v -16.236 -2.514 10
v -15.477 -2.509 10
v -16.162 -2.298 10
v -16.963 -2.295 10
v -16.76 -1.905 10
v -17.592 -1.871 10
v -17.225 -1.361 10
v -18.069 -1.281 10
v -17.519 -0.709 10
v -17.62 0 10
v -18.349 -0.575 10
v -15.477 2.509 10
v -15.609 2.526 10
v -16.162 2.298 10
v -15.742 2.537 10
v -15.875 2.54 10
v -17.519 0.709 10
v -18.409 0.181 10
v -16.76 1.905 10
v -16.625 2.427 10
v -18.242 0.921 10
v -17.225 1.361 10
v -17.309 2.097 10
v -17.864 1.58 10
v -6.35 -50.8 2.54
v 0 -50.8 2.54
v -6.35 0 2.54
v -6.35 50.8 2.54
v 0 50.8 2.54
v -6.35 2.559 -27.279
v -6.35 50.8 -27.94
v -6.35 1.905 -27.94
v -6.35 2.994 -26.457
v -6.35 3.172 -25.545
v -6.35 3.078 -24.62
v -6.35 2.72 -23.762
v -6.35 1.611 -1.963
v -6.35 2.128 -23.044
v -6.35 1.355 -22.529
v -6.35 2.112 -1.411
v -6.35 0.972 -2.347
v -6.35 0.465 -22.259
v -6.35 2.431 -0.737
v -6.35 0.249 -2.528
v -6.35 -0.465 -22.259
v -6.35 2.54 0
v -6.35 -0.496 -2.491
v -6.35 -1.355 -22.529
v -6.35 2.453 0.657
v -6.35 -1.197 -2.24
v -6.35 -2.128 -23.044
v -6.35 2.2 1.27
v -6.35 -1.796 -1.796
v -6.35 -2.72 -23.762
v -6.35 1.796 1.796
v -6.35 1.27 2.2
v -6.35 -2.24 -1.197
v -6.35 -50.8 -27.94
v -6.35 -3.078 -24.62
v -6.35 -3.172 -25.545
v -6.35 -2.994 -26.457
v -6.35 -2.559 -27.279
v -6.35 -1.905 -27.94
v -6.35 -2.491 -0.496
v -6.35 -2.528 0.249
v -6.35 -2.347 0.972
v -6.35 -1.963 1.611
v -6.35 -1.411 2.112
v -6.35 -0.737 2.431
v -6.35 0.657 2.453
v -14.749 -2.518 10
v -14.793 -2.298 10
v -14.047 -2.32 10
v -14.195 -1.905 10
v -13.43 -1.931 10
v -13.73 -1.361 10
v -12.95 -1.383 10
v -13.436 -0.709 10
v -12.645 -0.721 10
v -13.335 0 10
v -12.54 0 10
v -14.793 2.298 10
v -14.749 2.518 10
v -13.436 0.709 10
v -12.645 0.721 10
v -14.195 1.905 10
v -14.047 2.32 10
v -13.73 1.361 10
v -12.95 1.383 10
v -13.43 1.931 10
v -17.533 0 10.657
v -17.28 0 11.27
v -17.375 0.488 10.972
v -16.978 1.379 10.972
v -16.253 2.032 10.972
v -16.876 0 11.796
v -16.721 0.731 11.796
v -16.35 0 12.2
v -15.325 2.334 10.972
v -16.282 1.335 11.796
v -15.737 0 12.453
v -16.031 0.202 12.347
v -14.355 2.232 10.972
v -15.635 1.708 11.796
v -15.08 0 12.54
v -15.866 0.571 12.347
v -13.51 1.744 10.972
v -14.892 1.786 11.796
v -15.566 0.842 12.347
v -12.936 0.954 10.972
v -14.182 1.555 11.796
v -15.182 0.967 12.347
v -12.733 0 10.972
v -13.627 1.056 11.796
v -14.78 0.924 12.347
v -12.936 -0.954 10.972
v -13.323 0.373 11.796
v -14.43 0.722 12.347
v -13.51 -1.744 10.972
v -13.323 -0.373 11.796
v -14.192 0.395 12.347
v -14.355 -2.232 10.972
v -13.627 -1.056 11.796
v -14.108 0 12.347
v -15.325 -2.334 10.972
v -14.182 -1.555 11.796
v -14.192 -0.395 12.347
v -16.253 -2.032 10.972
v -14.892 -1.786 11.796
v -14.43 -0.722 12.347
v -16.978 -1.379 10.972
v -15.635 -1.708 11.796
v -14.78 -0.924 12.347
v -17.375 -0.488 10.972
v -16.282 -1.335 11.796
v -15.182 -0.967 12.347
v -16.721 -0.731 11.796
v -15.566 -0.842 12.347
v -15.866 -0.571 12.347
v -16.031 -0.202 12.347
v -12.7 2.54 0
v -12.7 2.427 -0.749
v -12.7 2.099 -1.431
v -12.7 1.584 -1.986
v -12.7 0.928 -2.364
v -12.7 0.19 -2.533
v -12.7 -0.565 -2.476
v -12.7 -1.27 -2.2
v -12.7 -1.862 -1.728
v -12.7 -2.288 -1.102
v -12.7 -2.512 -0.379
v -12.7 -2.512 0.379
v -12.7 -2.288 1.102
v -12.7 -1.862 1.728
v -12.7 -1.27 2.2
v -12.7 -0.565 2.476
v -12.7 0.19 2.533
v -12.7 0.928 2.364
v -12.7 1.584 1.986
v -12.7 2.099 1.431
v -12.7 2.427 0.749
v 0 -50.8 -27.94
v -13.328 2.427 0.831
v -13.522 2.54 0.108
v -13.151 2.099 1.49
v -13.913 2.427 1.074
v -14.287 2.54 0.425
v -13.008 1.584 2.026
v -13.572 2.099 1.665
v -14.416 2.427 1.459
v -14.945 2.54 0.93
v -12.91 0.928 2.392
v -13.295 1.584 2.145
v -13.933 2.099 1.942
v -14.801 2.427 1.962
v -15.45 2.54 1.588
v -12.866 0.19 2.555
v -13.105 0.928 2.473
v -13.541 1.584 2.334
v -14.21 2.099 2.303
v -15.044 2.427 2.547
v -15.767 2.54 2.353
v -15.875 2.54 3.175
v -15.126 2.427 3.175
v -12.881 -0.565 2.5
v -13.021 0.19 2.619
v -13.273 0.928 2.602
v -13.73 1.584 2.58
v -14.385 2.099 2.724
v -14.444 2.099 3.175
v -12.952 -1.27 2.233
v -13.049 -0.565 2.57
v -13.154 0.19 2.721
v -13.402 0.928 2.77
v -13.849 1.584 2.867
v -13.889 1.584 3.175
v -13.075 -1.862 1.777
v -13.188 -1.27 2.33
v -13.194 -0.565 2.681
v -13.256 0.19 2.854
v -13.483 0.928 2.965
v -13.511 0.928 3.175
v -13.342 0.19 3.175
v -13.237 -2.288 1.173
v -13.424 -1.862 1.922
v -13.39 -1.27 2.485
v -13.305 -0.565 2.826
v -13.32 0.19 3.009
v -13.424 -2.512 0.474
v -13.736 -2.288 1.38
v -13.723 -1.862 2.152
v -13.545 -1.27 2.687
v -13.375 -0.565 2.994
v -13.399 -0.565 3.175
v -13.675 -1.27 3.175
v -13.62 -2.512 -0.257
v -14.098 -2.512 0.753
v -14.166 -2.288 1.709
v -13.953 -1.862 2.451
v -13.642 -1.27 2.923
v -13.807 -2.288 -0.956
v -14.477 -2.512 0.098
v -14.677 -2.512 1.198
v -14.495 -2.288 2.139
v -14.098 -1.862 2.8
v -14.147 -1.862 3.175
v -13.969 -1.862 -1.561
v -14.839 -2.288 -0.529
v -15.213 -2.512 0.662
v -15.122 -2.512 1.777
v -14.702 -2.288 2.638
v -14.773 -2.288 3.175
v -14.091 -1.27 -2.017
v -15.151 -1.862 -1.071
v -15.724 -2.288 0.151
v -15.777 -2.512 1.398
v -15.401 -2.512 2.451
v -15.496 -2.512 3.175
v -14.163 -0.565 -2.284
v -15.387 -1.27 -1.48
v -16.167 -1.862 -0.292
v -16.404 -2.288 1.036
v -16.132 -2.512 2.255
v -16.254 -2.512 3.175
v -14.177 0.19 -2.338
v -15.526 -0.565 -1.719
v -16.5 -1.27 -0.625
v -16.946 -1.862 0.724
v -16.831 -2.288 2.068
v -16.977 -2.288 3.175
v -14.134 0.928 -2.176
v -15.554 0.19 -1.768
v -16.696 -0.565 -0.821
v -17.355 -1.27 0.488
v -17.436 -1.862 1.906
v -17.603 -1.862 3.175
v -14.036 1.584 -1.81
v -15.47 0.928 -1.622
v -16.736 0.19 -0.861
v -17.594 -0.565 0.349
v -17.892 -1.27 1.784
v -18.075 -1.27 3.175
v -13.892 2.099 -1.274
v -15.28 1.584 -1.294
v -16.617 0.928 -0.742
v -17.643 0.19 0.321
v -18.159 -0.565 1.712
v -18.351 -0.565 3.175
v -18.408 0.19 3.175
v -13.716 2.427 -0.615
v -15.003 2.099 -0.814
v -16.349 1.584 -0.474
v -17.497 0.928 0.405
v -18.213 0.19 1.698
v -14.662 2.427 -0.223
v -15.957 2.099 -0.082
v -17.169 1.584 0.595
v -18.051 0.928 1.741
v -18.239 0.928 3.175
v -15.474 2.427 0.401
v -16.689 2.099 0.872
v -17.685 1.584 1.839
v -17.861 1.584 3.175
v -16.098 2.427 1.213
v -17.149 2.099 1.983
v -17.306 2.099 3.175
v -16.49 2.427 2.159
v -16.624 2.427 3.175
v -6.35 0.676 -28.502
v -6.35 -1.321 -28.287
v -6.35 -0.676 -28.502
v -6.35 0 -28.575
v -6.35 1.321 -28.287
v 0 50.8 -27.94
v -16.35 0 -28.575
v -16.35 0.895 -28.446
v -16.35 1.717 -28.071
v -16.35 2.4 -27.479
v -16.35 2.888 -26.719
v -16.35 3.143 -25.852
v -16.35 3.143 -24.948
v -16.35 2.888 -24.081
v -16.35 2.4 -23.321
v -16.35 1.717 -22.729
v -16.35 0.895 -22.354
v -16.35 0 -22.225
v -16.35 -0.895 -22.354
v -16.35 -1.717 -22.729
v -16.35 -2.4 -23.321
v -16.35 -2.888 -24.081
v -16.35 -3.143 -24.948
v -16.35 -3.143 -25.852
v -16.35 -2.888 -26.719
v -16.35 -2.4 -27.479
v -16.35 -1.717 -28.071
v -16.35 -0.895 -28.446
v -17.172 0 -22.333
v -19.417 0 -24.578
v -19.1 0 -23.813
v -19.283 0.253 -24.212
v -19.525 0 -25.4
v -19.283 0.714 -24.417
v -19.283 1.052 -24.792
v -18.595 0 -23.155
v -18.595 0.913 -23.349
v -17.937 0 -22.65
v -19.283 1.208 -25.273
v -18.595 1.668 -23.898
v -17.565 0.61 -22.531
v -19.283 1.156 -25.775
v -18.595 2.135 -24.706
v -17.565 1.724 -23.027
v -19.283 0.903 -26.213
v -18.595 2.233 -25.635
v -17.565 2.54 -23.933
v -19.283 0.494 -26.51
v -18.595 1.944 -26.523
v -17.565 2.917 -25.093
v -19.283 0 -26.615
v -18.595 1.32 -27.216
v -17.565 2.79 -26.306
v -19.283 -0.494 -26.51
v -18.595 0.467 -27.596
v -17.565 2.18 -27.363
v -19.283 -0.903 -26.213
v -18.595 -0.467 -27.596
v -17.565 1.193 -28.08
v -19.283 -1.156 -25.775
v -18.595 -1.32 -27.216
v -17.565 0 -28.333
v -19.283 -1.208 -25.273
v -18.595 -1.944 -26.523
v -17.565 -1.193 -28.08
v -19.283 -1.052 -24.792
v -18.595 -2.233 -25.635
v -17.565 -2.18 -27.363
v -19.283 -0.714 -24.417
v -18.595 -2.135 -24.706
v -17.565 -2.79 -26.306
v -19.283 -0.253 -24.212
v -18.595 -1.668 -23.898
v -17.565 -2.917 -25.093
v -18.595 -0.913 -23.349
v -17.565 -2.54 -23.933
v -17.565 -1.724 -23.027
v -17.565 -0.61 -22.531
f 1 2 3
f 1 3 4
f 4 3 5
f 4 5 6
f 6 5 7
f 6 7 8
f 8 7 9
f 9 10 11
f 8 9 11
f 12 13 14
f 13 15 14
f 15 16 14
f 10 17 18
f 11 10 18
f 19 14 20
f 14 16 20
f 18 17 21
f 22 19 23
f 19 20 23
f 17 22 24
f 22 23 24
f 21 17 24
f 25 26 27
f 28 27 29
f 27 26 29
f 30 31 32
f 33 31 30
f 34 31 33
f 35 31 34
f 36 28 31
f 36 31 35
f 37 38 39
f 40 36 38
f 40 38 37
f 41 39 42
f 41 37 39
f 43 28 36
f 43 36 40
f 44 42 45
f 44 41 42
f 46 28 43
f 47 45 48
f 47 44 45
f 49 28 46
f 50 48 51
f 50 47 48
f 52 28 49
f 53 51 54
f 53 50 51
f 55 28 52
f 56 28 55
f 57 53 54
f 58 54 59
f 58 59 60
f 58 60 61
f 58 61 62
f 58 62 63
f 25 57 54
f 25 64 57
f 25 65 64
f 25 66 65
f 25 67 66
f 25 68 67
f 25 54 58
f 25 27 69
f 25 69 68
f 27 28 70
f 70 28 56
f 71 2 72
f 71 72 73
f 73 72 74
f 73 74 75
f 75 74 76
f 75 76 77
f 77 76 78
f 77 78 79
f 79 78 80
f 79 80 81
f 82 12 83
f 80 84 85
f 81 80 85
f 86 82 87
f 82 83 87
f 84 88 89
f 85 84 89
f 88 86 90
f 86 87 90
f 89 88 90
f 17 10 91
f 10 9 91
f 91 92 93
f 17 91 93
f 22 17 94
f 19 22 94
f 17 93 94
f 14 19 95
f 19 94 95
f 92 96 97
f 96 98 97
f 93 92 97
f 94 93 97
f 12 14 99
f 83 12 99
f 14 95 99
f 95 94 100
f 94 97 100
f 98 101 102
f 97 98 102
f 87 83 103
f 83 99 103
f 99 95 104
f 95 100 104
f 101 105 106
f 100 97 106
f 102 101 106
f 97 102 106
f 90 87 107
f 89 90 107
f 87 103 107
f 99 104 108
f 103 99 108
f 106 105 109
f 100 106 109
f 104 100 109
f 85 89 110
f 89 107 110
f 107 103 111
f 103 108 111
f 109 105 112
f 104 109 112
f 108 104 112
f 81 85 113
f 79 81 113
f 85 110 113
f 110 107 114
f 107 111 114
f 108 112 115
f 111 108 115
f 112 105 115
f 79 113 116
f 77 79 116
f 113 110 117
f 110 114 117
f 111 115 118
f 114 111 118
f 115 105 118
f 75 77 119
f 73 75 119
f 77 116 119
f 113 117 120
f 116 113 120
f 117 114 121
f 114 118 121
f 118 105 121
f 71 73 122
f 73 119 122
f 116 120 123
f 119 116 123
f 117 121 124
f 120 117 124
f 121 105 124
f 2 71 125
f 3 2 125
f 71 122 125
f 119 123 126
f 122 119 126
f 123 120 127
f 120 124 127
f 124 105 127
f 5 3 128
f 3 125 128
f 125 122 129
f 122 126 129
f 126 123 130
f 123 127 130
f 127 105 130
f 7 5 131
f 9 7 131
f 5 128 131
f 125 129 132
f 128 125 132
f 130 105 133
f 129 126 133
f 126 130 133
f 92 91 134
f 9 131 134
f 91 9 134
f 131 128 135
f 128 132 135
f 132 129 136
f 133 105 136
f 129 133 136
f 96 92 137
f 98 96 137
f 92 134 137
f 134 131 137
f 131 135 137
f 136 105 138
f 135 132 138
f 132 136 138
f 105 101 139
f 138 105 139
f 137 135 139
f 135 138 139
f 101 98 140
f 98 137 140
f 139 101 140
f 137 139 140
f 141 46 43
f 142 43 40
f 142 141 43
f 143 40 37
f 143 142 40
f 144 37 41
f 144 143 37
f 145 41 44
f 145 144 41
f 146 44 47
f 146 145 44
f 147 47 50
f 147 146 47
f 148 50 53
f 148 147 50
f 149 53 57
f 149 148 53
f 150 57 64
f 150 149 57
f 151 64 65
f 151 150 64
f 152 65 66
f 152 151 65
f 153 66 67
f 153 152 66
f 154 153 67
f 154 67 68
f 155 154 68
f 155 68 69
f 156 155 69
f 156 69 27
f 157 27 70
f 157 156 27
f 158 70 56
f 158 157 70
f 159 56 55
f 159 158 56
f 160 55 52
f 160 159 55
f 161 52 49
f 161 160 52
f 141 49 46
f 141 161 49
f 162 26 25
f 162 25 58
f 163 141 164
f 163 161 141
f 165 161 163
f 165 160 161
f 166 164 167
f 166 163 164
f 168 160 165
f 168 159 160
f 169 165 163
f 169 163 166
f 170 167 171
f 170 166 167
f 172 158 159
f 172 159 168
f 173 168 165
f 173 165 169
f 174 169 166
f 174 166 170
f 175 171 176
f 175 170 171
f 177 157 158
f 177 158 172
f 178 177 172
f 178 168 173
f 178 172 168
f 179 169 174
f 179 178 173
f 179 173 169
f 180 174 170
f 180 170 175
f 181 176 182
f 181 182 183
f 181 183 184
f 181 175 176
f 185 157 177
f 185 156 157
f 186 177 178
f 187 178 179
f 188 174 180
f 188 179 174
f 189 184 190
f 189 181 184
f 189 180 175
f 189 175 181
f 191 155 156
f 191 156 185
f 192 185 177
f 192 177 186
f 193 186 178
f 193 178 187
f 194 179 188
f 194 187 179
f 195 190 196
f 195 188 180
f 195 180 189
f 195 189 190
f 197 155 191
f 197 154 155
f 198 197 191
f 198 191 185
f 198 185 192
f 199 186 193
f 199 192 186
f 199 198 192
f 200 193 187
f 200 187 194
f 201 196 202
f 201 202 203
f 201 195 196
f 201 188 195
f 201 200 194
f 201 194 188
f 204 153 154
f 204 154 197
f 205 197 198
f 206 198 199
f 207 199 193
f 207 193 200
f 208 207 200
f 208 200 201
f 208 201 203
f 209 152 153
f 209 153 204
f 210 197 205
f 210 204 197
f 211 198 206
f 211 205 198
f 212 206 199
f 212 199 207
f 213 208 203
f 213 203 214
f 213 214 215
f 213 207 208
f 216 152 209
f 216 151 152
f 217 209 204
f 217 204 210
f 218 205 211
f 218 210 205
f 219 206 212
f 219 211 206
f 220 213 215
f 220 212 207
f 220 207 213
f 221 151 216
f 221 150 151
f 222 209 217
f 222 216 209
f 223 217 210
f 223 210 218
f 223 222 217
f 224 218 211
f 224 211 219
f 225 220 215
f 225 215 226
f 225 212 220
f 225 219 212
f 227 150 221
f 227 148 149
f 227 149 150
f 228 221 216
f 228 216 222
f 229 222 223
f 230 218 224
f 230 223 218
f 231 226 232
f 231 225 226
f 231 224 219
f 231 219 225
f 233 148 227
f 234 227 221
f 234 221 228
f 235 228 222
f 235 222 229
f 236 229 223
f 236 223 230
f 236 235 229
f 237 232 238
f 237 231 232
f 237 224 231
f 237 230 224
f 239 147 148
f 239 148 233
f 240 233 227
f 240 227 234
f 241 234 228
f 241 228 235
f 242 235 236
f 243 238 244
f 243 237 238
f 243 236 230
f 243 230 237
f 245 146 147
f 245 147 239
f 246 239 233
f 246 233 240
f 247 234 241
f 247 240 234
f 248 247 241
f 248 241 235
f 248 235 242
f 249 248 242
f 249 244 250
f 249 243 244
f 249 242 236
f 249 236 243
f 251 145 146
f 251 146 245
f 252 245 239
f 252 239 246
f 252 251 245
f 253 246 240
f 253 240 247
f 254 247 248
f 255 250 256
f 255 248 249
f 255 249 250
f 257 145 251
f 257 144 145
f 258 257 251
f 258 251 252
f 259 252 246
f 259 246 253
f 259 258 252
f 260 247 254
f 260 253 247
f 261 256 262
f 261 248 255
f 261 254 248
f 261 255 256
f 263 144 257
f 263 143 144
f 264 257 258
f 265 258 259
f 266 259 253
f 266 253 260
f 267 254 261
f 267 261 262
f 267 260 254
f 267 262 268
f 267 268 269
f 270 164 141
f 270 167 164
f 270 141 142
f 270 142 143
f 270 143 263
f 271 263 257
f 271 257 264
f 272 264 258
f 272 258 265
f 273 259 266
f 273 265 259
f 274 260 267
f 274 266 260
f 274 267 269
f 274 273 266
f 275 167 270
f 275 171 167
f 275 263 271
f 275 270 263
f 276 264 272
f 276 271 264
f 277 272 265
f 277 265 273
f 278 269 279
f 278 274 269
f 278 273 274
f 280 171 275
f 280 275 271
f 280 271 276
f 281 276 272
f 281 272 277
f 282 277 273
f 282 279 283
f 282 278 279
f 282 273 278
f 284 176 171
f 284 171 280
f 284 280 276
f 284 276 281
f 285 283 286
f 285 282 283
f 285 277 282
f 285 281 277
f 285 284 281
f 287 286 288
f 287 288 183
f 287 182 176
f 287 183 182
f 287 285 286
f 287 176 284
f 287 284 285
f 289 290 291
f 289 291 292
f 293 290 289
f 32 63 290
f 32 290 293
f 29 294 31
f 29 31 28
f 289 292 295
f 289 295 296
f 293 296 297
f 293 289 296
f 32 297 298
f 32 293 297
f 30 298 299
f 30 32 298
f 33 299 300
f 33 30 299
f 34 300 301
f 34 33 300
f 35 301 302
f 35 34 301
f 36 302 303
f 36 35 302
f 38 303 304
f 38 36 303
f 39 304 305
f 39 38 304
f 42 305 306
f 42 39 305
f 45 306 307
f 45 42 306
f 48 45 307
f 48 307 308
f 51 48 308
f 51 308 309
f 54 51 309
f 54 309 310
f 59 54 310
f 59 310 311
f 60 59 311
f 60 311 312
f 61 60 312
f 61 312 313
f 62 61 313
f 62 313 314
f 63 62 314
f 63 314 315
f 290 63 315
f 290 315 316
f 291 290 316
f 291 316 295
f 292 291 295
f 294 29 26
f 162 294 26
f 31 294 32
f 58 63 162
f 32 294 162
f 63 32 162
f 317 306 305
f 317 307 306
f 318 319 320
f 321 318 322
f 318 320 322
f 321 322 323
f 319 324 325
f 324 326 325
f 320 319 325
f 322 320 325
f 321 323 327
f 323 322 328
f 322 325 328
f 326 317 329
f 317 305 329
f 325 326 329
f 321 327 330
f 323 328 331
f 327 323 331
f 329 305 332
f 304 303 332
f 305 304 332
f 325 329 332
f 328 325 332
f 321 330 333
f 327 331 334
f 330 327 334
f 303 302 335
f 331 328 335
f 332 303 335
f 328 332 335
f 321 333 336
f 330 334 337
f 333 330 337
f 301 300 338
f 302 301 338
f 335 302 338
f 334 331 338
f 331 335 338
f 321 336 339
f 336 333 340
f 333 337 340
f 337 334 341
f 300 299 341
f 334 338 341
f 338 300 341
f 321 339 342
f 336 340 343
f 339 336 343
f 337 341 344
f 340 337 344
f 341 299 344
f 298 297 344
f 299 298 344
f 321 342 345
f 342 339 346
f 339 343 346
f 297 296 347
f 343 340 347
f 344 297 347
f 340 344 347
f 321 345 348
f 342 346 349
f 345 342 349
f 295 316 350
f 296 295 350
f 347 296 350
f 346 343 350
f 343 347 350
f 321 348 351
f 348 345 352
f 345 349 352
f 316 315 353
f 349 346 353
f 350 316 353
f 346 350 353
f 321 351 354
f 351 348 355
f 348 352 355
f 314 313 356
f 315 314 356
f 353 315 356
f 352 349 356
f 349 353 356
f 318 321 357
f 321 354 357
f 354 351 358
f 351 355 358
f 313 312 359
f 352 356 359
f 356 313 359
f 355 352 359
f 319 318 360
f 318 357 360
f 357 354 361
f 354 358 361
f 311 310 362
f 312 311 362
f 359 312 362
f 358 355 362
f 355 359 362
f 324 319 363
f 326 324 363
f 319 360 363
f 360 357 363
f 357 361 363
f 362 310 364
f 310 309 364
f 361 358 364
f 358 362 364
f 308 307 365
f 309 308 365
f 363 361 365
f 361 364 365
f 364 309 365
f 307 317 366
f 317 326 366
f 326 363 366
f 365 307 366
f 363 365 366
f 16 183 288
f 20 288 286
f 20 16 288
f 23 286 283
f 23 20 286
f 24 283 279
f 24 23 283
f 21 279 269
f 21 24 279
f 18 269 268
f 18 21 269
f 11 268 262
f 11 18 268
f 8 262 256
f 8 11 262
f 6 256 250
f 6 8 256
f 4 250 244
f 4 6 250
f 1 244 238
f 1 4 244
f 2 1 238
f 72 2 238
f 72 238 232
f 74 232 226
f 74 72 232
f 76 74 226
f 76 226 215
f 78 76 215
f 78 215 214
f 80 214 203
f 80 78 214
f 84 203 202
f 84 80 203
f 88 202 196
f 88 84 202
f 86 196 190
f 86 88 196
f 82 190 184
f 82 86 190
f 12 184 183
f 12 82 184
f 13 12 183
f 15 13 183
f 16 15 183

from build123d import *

# Parameters (mm, degrees)
BOSS_EXTRUDE1_DEPTH = 6.35
PEG_BASE_R          = 2.54
BOTTOM_PEG_R        = 3.175
BOSS_EXTRUDE2_DEPTH = 10


with BuildPart() as part:
    # Base → Boss-Extrude1 (new body)
    with BuildSketch(Plane.YZ):
        Polygon((-50.8, 2.54), (50.8, 2.54), (50.8, -2.54), (50.8, -27.94), (-50.8, -27.94), (-50.8, -2.54), align=None)
    extrude(amount=-BOSS_EXTRUDE1_DEPTH)

    # Top Peg: sweep along a path in Sweep 2
    with BuildLine(Plane(origin=(0, 0, 0), x_dir=(-1, 0, 0), z_dir=(0, 1, 0))) as top_peg_path:
        Line((6.35, 0), (12.7, 0))
        ThreePointArc((12.7, 0), (14.94506403, 0.92993597), (15.875, 3.175))
        Line((15.875, 3.175), (15.875, 10))
    # Peg Base → Top Peg (sweep)
    with BuildSketch(Plane.YZ.offset(-6.35)):
        Circle(PEG_BASE_R)
    sweep(path=top_peg_path.line)

    # Bottom Peg → Boss-Extrude2 (add)
    with BuildSketch(Plane.YZ.offset(-6.35)):
        with Locations(Location((0, -25.4, 0), (0, 0, 270))):
            Circle(BOTTOM_PEG_R)
    extrude(amount=-BOSS_EXTRUDE2_DEPTH)

    # Sketch4 → Revolve1 (revolve)
    with BuildSketch(Plane(origin=(0, 0, 0), x_dir=(-1, 0, 0), z_dir=(0, 1, 0))):
        with BuildLine():
            Line((15.08, 12.54), (15.08, 10))
            Line((15.08, 10), (17.62, 10))
            ThreePointArc((17.62, 10), (16.876051224, 11.796051224), (15.08, 12.54))
        make_face()
    revolve(axis=Axis((-15.08, 0, 12.54), (0, 0, -1)))

    # Bottom Ball Head → Revolve2 (revolve)
    with BuildSketch(Plane(origin=(0, 0, 0), x_dir=(-1, 0, 0), z_dir=(0, 1, 0)), mode=Mode.PRIVATE) as revolve2_sk:
        with BuildLine():
            ThreePointArc((19.525, -25.4), (18.59506403, -27.64506403), (16.35, -28.575))
            Line((16.35, -28.575), (16.35, -25.4))
            Line((16.35, -25.4), (19.525, -25.4))
        make_face()
    revolve(revolve2_sk.sketch.rotate(Axis((-16.35, 0, -25.4), (-1, 0, 0)), 180), axis=Axis((-16.35, 0, -25.4), (-1, 0, 0)))


solid = part.part
